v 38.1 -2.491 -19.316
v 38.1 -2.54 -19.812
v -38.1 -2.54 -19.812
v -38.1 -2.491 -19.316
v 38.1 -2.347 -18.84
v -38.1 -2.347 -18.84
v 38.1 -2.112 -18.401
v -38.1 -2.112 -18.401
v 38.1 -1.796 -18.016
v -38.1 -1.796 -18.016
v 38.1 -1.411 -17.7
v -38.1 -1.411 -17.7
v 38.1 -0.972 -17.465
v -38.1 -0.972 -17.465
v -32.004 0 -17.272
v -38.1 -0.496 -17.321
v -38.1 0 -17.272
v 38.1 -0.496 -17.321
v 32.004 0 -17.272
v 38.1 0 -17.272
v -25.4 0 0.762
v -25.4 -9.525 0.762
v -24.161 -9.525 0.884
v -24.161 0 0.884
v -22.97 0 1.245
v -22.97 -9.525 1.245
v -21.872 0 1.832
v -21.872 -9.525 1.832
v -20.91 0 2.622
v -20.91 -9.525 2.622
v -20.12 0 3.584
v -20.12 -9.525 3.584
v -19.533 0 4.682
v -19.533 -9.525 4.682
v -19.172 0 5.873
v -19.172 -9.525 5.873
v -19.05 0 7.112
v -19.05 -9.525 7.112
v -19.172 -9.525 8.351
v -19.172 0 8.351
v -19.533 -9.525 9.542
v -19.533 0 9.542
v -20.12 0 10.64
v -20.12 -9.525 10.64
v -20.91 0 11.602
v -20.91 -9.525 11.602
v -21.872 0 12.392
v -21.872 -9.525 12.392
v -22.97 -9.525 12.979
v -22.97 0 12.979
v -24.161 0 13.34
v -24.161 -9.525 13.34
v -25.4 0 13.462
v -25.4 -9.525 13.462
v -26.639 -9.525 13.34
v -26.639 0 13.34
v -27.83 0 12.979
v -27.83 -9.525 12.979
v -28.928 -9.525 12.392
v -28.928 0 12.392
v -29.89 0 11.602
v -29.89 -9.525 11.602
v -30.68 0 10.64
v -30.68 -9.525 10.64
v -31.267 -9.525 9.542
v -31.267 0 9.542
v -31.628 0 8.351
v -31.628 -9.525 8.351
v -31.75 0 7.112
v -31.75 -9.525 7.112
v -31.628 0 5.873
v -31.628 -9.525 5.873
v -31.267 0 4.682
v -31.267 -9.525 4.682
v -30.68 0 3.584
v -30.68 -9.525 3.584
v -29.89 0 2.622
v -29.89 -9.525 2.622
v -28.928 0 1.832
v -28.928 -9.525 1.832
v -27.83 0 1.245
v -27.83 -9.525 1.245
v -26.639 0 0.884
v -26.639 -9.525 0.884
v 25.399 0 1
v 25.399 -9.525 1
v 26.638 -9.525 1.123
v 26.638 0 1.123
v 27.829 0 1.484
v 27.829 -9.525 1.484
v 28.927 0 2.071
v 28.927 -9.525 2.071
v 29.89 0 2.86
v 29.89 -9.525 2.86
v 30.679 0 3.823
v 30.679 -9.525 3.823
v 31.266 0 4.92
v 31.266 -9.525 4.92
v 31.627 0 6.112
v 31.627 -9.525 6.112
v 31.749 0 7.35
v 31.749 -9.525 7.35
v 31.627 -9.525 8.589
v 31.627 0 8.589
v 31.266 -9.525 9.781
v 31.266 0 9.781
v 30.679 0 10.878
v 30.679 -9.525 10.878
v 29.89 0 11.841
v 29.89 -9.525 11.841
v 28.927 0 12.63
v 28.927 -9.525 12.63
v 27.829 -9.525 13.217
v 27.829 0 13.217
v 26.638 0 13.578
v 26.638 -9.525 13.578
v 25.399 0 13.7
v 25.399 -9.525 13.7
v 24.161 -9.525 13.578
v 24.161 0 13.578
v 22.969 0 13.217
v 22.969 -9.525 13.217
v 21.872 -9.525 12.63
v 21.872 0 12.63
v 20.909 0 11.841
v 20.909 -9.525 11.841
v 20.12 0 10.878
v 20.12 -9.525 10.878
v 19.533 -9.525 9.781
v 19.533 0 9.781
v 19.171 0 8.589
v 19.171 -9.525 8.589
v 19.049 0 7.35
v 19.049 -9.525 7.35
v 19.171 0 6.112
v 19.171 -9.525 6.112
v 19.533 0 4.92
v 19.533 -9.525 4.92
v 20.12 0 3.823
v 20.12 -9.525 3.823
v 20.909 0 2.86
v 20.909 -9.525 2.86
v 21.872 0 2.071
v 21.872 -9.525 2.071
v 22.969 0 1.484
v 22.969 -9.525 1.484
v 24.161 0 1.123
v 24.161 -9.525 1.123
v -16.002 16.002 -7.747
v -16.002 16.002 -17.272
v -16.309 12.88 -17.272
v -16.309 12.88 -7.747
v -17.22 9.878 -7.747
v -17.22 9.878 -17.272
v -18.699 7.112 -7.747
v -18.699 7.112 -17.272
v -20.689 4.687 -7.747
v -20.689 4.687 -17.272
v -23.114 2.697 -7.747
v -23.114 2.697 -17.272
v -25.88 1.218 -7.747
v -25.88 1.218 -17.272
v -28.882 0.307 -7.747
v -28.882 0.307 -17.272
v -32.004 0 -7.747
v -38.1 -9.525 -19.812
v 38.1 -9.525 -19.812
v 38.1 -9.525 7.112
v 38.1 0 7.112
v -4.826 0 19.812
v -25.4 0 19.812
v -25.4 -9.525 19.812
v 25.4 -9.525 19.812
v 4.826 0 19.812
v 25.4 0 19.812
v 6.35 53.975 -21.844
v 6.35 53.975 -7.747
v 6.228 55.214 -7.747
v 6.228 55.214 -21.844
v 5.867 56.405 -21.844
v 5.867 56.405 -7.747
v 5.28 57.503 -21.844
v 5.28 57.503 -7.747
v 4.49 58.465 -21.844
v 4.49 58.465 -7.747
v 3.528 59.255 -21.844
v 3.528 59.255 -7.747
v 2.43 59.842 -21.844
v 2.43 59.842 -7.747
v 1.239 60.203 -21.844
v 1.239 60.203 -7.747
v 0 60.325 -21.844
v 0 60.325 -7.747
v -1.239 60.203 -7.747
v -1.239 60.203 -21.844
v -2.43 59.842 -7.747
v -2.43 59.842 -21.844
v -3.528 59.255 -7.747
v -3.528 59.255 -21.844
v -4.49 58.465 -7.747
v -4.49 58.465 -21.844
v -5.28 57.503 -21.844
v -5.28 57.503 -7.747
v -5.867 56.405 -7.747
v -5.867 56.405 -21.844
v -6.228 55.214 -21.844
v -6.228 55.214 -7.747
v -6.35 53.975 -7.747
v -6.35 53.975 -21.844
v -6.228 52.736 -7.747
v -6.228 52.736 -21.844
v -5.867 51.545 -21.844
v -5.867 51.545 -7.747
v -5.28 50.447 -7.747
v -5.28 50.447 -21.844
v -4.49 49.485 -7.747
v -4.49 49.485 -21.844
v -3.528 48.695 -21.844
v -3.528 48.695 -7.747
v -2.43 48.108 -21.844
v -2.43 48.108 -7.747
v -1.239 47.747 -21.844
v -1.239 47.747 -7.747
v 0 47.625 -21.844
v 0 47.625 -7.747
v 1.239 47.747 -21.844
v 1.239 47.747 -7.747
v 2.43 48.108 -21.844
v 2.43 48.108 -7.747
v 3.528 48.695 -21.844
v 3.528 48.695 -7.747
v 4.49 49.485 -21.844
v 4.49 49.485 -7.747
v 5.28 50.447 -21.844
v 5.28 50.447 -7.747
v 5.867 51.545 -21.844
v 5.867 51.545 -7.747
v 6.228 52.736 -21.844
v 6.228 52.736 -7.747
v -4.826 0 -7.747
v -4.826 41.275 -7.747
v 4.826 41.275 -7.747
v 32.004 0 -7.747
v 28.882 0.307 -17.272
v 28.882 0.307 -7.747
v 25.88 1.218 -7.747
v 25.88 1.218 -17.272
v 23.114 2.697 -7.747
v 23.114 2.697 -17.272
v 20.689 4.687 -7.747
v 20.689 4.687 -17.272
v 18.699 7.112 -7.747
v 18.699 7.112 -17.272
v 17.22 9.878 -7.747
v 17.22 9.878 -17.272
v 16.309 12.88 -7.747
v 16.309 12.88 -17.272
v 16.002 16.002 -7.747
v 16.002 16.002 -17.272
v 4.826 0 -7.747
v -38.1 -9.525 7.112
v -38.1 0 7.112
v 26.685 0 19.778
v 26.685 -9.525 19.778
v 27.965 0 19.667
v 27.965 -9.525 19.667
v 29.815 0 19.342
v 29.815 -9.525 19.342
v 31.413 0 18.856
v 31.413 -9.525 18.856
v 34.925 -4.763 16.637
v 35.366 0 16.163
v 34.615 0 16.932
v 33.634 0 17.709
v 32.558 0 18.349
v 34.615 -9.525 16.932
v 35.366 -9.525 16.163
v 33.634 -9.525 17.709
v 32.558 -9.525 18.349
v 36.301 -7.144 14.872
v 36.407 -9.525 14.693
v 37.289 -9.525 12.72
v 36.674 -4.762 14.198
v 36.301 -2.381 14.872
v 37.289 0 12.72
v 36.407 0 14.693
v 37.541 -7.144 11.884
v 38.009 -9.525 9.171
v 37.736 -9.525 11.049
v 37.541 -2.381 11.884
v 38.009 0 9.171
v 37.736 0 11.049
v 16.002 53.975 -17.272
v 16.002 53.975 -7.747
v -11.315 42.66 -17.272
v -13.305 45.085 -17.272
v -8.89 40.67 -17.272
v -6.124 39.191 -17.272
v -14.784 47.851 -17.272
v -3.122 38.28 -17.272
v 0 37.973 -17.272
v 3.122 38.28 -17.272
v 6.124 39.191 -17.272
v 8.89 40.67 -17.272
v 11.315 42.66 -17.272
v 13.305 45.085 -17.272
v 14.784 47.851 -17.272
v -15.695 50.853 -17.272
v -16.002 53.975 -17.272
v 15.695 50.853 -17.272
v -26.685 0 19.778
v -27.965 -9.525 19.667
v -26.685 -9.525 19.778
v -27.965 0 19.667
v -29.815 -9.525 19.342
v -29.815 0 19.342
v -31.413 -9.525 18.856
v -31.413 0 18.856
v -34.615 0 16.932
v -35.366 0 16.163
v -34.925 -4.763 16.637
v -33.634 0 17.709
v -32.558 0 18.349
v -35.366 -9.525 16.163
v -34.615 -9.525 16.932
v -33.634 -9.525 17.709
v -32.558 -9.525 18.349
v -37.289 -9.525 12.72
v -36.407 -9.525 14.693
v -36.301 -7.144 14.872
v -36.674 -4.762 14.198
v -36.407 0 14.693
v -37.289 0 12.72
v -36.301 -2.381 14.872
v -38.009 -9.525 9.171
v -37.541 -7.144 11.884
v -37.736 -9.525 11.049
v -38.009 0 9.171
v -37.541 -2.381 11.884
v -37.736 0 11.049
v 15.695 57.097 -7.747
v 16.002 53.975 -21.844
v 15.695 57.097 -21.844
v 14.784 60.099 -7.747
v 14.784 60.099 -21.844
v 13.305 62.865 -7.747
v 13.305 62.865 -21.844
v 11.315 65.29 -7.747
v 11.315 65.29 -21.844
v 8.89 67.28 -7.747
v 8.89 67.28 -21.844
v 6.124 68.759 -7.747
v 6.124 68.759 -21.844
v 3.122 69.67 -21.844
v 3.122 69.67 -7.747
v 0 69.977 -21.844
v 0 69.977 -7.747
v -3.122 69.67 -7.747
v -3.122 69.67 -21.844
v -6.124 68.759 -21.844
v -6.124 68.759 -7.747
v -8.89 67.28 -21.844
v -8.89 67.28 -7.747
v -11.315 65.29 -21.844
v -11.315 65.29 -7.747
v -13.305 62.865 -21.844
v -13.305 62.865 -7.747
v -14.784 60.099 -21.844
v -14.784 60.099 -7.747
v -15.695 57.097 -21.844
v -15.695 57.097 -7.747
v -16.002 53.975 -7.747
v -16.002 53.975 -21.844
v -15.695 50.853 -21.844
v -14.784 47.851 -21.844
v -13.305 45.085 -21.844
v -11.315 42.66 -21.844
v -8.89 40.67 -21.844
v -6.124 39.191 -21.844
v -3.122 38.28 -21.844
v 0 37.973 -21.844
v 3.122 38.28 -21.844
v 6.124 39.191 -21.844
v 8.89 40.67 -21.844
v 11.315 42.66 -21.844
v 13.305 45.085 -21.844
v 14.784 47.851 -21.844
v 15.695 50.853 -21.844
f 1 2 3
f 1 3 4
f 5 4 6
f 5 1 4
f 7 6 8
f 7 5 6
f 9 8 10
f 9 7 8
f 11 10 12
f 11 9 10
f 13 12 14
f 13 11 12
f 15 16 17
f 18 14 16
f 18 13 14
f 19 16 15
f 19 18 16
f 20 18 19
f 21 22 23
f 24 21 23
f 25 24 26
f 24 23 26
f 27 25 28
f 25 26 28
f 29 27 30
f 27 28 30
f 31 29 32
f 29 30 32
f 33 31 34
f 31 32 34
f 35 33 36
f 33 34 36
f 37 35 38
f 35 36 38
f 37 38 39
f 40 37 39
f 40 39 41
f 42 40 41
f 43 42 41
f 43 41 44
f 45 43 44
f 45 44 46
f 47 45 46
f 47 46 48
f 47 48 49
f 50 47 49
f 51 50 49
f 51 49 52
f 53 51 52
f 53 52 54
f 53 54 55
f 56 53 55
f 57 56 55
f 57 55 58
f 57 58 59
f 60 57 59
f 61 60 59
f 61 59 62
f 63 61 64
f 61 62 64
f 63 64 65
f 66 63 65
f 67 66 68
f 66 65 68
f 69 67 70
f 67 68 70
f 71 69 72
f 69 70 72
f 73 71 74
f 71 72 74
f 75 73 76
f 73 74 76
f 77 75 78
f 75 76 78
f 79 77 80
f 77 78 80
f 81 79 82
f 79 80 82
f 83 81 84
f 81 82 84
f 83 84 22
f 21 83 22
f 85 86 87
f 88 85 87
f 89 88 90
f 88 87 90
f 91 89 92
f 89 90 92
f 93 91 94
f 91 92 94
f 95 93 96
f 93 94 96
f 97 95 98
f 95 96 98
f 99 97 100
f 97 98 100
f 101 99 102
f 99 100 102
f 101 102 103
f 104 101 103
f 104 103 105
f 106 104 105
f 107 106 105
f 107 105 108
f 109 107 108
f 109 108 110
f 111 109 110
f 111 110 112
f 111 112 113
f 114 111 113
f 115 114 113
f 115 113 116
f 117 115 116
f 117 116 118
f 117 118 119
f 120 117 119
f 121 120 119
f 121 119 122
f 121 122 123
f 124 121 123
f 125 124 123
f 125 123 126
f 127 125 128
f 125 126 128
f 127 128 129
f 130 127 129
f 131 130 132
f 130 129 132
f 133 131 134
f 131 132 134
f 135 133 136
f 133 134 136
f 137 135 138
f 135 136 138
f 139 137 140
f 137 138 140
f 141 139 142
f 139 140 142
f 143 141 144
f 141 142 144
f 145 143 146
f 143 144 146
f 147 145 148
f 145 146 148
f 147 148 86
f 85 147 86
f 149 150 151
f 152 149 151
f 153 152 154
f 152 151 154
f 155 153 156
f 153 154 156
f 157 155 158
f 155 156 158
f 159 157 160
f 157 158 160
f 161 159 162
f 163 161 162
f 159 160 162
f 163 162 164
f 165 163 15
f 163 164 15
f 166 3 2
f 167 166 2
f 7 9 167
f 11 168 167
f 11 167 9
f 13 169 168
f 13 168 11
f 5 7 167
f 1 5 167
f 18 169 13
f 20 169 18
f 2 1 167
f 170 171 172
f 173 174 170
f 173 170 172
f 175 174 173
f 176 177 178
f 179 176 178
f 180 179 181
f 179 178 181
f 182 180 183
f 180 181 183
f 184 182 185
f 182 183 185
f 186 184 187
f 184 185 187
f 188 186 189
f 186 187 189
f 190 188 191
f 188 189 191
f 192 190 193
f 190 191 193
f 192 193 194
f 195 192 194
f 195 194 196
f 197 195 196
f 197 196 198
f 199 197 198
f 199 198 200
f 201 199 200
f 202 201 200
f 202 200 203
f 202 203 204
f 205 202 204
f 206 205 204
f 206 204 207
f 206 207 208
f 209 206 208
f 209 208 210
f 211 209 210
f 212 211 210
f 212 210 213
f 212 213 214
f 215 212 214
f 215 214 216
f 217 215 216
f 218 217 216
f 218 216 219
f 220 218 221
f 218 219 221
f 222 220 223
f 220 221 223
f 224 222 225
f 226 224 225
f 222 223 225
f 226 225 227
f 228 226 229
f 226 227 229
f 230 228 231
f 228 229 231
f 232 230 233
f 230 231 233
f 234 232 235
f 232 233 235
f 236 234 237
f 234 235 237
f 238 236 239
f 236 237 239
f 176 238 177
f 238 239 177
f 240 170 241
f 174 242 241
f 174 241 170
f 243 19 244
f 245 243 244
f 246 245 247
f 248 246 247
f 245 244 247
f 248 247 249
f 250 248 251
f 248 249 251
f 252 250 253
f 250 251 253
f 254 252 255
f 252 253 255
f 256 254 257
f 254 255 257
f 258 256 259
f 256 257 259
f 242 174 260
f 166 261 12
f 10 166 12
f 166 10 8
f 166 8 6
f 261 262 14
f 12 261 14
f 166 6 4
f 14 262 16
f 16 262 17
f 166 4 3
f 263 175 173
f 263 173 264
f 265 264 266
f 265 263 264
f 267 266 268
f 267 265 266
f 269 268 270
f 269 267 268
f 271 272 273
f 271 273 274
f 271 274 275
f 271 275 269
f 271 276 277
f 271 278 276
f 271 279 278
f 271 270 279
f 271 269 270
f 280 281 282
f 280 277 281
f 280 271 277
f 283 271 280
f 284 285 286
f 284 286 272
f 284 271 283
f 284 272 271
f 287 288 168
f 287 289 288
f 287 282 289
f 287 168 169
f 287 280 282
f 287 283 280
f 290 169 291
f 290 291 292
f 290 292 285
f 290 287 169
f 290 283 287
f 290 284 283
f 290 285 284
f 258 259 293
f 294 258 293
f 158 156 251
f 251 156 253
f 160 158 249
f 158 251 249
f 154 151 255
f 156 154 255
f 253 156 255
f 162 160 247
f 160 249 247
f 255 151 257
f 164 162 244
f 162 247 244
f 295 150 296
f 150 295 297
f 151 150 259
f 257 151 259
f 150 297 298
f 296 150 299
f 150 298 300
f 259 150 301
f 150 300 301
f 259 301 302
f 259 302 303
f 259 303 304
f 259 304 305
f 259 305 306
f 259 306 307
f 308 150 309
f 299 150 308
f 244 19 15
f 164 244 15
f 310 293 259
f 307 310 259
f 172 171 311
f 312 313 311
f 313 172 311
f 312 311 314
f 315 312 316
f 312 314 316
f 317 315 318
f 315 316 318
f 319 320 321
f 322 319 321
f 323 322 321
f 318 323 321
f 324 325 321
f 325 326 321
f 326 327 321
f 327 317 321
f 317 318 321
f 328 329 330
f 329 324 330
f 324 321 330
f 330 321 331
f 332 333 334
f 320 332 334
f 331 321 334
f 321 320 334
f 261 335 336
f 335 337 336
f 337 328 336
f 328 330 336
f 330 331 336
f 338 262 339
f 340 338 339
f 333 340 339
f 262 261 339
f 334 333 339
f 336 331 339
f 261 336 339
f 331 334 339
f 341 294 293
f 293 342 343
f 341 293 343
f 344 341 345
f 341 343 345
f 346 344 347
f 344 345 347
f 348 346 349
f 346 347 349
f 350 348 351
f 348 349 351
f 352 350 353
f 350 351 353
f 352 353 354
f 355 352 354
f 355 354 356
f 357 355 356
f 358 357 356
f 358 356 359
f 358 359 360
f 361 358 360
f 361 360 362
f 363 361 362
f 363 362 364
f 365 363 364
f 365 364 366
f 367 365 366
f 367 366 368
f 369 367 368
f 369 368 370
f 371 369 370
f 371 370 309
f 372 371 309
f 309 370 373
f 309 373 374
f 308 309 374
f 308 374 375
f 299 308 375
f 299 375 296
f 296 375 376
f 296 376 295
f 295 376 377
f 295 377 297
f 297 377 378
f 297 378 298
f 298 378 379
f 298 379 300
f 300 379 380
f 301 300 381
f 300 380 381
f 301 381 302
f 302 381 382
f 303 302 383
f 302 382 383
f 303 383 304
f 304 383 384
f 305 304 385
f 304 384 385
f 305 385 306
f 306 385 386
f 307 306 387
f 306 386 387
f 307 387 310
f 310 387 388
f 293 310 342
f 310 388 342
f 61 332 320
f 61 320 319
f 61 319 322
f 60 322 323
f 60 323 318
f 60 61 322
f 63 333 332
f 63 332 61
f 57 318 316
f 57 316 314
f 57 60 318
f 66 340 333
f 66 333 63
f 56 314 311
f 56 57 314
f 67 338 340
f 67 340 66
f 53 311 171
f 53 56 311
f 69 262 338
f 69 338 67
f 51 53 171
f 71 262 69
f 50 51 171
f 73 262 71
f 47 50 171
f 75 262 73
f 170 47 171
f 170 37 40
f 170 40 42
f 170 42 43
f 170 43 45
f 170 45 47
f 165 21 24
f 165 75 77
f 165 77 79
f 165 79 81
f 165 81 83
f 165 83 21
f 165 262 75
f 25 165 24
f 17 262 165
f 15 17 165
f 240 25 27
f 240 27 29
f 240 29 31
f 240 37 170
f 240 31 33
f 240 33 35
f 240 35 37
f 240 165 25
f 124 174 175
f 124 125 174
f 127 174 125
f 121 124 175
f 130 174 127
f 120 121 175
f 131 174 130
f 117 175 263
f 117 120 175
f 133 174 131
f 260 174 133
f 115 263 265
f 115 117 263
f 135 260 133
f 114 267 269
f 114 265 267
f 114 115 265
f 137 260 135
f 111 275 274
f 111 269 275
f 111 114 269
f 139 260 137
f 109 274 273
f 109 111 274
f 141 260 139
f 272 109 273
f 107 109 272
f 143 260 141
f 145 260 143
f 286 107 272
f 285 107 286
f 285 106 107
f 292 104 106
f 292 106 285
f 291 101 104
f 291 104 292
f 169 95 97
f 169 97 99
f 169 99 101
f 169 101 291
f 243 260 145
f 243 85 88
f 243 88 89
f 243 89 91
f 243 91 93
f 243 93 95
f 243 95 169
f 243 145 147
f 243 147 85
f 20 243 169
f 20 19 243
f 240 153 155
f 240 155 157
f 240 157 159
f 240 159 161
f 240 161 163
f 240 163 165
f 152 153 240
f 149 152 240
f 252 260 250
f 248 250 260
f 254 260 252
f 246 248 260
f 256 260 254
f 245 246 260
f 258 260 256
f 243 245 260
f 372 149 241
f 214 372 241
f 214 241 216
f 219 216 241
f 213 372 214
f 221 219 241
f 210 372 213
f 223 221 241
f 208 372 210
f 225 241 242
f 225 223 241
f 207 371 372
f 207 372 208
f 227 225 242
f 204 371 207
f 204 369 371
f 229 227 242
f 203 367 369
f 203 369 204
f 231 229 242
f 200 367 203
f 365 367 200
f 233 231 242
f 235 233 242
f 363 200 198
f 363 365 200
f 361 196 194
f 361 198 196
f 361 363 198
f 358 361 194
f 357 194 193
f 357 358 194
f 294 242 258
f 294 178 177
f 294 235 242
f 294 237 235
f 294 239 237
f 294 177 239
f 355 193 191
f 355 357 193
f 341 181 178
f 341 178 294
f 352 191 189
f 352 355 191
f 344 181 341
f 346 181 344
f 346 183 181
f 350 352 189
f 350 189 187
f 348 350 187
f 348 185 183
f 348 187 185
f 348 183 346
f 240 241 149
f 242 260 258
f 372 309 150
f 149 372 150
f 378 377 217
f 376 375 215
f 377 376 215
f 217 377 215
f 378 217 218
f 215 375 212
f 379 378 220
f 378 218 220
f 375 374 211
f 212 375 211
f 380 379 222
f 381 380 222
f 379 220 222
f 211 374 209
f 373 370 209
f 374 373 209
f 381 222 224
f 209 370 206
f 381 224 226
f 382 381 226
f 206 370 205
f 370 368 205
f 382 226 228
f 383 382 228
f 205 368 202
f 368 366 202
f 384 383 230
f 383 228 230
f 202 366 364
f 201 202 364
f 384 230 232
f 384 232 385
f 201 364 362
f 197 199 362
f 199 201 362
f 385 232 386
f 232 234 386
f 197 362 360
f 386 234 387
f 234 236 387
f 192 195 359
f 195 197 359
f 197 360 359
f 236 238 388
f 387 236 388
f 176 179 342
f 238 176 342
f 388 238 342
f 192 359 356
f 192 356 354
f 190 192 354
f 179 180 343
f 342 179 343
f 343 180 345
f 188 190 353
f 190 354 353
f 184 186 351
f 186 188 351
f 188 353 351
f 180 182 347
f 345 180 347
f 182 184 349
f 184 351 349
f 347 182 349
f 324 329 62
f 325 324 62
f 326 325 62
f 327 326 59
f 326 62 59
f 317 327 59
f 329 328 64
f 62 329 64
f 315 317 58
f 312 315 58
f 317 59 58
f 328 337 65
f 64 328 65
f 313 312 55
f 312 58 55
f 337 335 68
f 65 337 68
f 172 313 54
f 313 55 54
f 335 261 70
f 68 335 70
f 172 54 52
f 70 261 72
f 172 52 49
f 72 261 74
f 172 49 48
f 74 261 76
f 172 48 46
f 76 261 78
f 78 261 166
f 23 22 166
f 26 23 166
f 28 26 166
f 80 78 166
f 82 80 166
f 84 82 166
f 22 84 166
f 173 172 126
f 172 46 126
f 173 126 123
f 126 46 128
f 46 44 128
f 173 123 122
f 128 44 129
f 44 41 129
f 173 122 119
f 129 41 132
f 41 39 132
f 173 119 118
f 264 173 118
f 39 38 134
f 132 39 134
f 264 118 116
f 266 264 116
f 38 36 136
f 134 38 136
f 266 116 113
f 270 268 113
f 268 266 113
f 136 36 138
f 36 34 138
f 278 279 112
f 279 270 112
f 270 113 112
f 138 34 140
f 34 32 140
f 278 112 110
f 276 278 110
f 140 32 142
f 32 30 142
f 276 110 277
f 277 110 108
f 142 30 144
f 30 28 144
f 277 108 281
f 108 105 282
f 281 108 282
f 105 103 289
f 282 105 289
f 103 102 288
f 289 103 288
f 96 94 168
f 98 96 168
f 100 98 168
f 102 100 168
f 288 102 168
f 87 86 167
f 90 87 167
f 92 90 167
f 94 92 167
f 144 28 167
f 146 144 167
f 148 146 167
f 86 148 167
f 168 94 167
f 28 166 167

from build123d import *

# Parameters (mm, degrees)
SKETCH1_W                  = 76.2
SKETCH1_H                  = 39.624
BOSS_EXTRUDE1_DEPTH        = 9.525
CUT_EXTRUDE1_DEPTH         = 80.307508907
FILLET1_SIZE               = 12.7
SKETCH12_R                 = 6.35
BOSS_EXTRUDE4_DEPTH        = 9.525
BOSS_EXTRUDE5_START        = -14.097
SKETCH13_R                 = 16.002
BOSS_EXTRUDE5_DEPTH        = 14.097
SKETCH14_R                 = 6.35
CUT_EXTRUDE4_DEPTH         = 85.308297475
BOSS_EXTRUDE6_DEPTH        = 4.826
F_3_8_0_5_DIAMETER_HOLE1_D = 12.7


with BuildPart() as part:
    # Sketch1 → Boss-Extrude1 (new body)
    with BuildSketch(Plane(origin=(0, 0, 0), x_dir=(1, 0, 0), z_dir=(0, 1, 0))):
        Rectangle(SKETCH1_W, SKETCH1_H)
    extrude(amount=-BOSS_EXTRUDE1_DEPTH)

    # Sketch2 → Cut-Extrude1 (cut, through all)
    with BuildSketch(Plane(origin=(38.1, 0, 0), x_dir=(0, 0, -1), z_dir=(1, 0, 0))):
        with BuildLine():
            Line((17.272, 0), (19.812, 0))
            Line((19.812, 0), (19.812, -2.54))
            ThreePointArc((19.812, -2.54), (18.015948776, -1.796051224), (17.272, 0))
        make_face()
    extrude(amount=-CUT_EXTRUDE1_DEPTH, mode=Mode.SUBTRACT)

    # Fillet1
    # a fillet whose section is not a circle: 12.7 mm, written as the material it takes off along each edge
    with BuildSketch(Plane(origin=(-38.1, 31.75, 19.812), x_dir=(1, 0, 0), z_dir=(0, -1, 0))) as fillet1_piece_1:
        with BuildLine():
            Bezier((FILLET1_SIZE, 0), (0, 0), (0, -FILLET1_SIZE), weights=[1, 1, 1])
            Line((0, -FILLET1_SIZE), (0, 0))
            Line((0, 0), (FILLET1_SIZE, 0))
        make_face()
    extrude(amount=73.025, mode=Mode.SUBTRACT)
    with BuildSketch(Plane(origin=(38.1, 31.75, 19.812), x_dir=(-1, 0, 0), z_dir=(0, -1, 0))) as fillet1_piece_2:
        with BuildLine():
            Bezier((FILLET1_SIZE, 0), (0, 0), (0, FILLET1_SIZE), weights=[1, 1, 1])
            Line((0, FILLET1_SIZE), (0, 0))
            Line((0, 0), (FILLET1_SIZE, 0))
        make_face()
    extrude(amount=73.025, mode=Mode.SUBTRACT)

    # Sketch12 → Boss-Extrude4 (add)
    with BuildSketch(Plane.XY.offset(-17.272)):
        with BuildLine():
            Line((-16.002, 53.975), (-16.002, 16.002))
            ThreePointArc((-16.002, 16.002), (-20.688877287, 4.686877287), (-32.004, 0))
            Line((-32.004, 0), (32.004, 0))
            ThreePointArc((32.004, 0), (20.688877287, 4.686877287), (16.002, 16.002))
            Line((16.002, 16.002), (16.002, 53.975))
            ThreePointArc((16.002, 53.975), (0, 69.977), (-16.002, 53.975))
        make_face()
        with Locations(Location((0, 53.975, 0), (0, 0, 180))):
            Circle(SKETCH12_R, mode=Mode.SUBTRACT)
    extrude(amount=BOSS_EXTRUDE4_DEPTH)

    # Sketch13 → Boss-Extrude5 (add)
    with BuildSketch(Plane.XY.offset(-7.747).offset(BOSS_EXTRUDE5_START)):
        with Locations((0, 53.975)):
            Circle(SKETCH13_R)
    extrude(amount=BOSS_EXTRUDE5_DEPTH)

    # Sketch14 → Cut-Extrude4 (cut, through all)
    with BuildSketch(Plane.XY.offset(-7.747)):
        with Locations((0, 53.975)):
            Circle(SKETCH14_R)
    extrude(amount=-CUT_EXTRUDE4_DEPTH, mode=Mode.SUBTRACT)

    # Sketch15 → Boss-Extrude6 (add, symmetric)
    with BuildSketch(Plane(origin=(0, 0, 0), x_dir=(0, 0, -1), z_dir=(1, 0, 0))):
        Polygon((7.747, 0), (7.747, 41.275), (-19.812, 0), align=None)
    extrude(amount=BOSS_EXTRUDE6_DEPTH, both=True)

    # 3/8 (0.5) Diameter Hole1 (through all)
    with Locations(Plane(origin=(-25.4, 0, 7.112), x_dir=(0, 0, 1), z_dir=(0, 1, 0))):
        with Locations((0, 0), (0.238495024, 50.799440156)):
            Hole(F_3_8_0_5_DIAMETER_HOLE1_D / 2)


solid = part.part
